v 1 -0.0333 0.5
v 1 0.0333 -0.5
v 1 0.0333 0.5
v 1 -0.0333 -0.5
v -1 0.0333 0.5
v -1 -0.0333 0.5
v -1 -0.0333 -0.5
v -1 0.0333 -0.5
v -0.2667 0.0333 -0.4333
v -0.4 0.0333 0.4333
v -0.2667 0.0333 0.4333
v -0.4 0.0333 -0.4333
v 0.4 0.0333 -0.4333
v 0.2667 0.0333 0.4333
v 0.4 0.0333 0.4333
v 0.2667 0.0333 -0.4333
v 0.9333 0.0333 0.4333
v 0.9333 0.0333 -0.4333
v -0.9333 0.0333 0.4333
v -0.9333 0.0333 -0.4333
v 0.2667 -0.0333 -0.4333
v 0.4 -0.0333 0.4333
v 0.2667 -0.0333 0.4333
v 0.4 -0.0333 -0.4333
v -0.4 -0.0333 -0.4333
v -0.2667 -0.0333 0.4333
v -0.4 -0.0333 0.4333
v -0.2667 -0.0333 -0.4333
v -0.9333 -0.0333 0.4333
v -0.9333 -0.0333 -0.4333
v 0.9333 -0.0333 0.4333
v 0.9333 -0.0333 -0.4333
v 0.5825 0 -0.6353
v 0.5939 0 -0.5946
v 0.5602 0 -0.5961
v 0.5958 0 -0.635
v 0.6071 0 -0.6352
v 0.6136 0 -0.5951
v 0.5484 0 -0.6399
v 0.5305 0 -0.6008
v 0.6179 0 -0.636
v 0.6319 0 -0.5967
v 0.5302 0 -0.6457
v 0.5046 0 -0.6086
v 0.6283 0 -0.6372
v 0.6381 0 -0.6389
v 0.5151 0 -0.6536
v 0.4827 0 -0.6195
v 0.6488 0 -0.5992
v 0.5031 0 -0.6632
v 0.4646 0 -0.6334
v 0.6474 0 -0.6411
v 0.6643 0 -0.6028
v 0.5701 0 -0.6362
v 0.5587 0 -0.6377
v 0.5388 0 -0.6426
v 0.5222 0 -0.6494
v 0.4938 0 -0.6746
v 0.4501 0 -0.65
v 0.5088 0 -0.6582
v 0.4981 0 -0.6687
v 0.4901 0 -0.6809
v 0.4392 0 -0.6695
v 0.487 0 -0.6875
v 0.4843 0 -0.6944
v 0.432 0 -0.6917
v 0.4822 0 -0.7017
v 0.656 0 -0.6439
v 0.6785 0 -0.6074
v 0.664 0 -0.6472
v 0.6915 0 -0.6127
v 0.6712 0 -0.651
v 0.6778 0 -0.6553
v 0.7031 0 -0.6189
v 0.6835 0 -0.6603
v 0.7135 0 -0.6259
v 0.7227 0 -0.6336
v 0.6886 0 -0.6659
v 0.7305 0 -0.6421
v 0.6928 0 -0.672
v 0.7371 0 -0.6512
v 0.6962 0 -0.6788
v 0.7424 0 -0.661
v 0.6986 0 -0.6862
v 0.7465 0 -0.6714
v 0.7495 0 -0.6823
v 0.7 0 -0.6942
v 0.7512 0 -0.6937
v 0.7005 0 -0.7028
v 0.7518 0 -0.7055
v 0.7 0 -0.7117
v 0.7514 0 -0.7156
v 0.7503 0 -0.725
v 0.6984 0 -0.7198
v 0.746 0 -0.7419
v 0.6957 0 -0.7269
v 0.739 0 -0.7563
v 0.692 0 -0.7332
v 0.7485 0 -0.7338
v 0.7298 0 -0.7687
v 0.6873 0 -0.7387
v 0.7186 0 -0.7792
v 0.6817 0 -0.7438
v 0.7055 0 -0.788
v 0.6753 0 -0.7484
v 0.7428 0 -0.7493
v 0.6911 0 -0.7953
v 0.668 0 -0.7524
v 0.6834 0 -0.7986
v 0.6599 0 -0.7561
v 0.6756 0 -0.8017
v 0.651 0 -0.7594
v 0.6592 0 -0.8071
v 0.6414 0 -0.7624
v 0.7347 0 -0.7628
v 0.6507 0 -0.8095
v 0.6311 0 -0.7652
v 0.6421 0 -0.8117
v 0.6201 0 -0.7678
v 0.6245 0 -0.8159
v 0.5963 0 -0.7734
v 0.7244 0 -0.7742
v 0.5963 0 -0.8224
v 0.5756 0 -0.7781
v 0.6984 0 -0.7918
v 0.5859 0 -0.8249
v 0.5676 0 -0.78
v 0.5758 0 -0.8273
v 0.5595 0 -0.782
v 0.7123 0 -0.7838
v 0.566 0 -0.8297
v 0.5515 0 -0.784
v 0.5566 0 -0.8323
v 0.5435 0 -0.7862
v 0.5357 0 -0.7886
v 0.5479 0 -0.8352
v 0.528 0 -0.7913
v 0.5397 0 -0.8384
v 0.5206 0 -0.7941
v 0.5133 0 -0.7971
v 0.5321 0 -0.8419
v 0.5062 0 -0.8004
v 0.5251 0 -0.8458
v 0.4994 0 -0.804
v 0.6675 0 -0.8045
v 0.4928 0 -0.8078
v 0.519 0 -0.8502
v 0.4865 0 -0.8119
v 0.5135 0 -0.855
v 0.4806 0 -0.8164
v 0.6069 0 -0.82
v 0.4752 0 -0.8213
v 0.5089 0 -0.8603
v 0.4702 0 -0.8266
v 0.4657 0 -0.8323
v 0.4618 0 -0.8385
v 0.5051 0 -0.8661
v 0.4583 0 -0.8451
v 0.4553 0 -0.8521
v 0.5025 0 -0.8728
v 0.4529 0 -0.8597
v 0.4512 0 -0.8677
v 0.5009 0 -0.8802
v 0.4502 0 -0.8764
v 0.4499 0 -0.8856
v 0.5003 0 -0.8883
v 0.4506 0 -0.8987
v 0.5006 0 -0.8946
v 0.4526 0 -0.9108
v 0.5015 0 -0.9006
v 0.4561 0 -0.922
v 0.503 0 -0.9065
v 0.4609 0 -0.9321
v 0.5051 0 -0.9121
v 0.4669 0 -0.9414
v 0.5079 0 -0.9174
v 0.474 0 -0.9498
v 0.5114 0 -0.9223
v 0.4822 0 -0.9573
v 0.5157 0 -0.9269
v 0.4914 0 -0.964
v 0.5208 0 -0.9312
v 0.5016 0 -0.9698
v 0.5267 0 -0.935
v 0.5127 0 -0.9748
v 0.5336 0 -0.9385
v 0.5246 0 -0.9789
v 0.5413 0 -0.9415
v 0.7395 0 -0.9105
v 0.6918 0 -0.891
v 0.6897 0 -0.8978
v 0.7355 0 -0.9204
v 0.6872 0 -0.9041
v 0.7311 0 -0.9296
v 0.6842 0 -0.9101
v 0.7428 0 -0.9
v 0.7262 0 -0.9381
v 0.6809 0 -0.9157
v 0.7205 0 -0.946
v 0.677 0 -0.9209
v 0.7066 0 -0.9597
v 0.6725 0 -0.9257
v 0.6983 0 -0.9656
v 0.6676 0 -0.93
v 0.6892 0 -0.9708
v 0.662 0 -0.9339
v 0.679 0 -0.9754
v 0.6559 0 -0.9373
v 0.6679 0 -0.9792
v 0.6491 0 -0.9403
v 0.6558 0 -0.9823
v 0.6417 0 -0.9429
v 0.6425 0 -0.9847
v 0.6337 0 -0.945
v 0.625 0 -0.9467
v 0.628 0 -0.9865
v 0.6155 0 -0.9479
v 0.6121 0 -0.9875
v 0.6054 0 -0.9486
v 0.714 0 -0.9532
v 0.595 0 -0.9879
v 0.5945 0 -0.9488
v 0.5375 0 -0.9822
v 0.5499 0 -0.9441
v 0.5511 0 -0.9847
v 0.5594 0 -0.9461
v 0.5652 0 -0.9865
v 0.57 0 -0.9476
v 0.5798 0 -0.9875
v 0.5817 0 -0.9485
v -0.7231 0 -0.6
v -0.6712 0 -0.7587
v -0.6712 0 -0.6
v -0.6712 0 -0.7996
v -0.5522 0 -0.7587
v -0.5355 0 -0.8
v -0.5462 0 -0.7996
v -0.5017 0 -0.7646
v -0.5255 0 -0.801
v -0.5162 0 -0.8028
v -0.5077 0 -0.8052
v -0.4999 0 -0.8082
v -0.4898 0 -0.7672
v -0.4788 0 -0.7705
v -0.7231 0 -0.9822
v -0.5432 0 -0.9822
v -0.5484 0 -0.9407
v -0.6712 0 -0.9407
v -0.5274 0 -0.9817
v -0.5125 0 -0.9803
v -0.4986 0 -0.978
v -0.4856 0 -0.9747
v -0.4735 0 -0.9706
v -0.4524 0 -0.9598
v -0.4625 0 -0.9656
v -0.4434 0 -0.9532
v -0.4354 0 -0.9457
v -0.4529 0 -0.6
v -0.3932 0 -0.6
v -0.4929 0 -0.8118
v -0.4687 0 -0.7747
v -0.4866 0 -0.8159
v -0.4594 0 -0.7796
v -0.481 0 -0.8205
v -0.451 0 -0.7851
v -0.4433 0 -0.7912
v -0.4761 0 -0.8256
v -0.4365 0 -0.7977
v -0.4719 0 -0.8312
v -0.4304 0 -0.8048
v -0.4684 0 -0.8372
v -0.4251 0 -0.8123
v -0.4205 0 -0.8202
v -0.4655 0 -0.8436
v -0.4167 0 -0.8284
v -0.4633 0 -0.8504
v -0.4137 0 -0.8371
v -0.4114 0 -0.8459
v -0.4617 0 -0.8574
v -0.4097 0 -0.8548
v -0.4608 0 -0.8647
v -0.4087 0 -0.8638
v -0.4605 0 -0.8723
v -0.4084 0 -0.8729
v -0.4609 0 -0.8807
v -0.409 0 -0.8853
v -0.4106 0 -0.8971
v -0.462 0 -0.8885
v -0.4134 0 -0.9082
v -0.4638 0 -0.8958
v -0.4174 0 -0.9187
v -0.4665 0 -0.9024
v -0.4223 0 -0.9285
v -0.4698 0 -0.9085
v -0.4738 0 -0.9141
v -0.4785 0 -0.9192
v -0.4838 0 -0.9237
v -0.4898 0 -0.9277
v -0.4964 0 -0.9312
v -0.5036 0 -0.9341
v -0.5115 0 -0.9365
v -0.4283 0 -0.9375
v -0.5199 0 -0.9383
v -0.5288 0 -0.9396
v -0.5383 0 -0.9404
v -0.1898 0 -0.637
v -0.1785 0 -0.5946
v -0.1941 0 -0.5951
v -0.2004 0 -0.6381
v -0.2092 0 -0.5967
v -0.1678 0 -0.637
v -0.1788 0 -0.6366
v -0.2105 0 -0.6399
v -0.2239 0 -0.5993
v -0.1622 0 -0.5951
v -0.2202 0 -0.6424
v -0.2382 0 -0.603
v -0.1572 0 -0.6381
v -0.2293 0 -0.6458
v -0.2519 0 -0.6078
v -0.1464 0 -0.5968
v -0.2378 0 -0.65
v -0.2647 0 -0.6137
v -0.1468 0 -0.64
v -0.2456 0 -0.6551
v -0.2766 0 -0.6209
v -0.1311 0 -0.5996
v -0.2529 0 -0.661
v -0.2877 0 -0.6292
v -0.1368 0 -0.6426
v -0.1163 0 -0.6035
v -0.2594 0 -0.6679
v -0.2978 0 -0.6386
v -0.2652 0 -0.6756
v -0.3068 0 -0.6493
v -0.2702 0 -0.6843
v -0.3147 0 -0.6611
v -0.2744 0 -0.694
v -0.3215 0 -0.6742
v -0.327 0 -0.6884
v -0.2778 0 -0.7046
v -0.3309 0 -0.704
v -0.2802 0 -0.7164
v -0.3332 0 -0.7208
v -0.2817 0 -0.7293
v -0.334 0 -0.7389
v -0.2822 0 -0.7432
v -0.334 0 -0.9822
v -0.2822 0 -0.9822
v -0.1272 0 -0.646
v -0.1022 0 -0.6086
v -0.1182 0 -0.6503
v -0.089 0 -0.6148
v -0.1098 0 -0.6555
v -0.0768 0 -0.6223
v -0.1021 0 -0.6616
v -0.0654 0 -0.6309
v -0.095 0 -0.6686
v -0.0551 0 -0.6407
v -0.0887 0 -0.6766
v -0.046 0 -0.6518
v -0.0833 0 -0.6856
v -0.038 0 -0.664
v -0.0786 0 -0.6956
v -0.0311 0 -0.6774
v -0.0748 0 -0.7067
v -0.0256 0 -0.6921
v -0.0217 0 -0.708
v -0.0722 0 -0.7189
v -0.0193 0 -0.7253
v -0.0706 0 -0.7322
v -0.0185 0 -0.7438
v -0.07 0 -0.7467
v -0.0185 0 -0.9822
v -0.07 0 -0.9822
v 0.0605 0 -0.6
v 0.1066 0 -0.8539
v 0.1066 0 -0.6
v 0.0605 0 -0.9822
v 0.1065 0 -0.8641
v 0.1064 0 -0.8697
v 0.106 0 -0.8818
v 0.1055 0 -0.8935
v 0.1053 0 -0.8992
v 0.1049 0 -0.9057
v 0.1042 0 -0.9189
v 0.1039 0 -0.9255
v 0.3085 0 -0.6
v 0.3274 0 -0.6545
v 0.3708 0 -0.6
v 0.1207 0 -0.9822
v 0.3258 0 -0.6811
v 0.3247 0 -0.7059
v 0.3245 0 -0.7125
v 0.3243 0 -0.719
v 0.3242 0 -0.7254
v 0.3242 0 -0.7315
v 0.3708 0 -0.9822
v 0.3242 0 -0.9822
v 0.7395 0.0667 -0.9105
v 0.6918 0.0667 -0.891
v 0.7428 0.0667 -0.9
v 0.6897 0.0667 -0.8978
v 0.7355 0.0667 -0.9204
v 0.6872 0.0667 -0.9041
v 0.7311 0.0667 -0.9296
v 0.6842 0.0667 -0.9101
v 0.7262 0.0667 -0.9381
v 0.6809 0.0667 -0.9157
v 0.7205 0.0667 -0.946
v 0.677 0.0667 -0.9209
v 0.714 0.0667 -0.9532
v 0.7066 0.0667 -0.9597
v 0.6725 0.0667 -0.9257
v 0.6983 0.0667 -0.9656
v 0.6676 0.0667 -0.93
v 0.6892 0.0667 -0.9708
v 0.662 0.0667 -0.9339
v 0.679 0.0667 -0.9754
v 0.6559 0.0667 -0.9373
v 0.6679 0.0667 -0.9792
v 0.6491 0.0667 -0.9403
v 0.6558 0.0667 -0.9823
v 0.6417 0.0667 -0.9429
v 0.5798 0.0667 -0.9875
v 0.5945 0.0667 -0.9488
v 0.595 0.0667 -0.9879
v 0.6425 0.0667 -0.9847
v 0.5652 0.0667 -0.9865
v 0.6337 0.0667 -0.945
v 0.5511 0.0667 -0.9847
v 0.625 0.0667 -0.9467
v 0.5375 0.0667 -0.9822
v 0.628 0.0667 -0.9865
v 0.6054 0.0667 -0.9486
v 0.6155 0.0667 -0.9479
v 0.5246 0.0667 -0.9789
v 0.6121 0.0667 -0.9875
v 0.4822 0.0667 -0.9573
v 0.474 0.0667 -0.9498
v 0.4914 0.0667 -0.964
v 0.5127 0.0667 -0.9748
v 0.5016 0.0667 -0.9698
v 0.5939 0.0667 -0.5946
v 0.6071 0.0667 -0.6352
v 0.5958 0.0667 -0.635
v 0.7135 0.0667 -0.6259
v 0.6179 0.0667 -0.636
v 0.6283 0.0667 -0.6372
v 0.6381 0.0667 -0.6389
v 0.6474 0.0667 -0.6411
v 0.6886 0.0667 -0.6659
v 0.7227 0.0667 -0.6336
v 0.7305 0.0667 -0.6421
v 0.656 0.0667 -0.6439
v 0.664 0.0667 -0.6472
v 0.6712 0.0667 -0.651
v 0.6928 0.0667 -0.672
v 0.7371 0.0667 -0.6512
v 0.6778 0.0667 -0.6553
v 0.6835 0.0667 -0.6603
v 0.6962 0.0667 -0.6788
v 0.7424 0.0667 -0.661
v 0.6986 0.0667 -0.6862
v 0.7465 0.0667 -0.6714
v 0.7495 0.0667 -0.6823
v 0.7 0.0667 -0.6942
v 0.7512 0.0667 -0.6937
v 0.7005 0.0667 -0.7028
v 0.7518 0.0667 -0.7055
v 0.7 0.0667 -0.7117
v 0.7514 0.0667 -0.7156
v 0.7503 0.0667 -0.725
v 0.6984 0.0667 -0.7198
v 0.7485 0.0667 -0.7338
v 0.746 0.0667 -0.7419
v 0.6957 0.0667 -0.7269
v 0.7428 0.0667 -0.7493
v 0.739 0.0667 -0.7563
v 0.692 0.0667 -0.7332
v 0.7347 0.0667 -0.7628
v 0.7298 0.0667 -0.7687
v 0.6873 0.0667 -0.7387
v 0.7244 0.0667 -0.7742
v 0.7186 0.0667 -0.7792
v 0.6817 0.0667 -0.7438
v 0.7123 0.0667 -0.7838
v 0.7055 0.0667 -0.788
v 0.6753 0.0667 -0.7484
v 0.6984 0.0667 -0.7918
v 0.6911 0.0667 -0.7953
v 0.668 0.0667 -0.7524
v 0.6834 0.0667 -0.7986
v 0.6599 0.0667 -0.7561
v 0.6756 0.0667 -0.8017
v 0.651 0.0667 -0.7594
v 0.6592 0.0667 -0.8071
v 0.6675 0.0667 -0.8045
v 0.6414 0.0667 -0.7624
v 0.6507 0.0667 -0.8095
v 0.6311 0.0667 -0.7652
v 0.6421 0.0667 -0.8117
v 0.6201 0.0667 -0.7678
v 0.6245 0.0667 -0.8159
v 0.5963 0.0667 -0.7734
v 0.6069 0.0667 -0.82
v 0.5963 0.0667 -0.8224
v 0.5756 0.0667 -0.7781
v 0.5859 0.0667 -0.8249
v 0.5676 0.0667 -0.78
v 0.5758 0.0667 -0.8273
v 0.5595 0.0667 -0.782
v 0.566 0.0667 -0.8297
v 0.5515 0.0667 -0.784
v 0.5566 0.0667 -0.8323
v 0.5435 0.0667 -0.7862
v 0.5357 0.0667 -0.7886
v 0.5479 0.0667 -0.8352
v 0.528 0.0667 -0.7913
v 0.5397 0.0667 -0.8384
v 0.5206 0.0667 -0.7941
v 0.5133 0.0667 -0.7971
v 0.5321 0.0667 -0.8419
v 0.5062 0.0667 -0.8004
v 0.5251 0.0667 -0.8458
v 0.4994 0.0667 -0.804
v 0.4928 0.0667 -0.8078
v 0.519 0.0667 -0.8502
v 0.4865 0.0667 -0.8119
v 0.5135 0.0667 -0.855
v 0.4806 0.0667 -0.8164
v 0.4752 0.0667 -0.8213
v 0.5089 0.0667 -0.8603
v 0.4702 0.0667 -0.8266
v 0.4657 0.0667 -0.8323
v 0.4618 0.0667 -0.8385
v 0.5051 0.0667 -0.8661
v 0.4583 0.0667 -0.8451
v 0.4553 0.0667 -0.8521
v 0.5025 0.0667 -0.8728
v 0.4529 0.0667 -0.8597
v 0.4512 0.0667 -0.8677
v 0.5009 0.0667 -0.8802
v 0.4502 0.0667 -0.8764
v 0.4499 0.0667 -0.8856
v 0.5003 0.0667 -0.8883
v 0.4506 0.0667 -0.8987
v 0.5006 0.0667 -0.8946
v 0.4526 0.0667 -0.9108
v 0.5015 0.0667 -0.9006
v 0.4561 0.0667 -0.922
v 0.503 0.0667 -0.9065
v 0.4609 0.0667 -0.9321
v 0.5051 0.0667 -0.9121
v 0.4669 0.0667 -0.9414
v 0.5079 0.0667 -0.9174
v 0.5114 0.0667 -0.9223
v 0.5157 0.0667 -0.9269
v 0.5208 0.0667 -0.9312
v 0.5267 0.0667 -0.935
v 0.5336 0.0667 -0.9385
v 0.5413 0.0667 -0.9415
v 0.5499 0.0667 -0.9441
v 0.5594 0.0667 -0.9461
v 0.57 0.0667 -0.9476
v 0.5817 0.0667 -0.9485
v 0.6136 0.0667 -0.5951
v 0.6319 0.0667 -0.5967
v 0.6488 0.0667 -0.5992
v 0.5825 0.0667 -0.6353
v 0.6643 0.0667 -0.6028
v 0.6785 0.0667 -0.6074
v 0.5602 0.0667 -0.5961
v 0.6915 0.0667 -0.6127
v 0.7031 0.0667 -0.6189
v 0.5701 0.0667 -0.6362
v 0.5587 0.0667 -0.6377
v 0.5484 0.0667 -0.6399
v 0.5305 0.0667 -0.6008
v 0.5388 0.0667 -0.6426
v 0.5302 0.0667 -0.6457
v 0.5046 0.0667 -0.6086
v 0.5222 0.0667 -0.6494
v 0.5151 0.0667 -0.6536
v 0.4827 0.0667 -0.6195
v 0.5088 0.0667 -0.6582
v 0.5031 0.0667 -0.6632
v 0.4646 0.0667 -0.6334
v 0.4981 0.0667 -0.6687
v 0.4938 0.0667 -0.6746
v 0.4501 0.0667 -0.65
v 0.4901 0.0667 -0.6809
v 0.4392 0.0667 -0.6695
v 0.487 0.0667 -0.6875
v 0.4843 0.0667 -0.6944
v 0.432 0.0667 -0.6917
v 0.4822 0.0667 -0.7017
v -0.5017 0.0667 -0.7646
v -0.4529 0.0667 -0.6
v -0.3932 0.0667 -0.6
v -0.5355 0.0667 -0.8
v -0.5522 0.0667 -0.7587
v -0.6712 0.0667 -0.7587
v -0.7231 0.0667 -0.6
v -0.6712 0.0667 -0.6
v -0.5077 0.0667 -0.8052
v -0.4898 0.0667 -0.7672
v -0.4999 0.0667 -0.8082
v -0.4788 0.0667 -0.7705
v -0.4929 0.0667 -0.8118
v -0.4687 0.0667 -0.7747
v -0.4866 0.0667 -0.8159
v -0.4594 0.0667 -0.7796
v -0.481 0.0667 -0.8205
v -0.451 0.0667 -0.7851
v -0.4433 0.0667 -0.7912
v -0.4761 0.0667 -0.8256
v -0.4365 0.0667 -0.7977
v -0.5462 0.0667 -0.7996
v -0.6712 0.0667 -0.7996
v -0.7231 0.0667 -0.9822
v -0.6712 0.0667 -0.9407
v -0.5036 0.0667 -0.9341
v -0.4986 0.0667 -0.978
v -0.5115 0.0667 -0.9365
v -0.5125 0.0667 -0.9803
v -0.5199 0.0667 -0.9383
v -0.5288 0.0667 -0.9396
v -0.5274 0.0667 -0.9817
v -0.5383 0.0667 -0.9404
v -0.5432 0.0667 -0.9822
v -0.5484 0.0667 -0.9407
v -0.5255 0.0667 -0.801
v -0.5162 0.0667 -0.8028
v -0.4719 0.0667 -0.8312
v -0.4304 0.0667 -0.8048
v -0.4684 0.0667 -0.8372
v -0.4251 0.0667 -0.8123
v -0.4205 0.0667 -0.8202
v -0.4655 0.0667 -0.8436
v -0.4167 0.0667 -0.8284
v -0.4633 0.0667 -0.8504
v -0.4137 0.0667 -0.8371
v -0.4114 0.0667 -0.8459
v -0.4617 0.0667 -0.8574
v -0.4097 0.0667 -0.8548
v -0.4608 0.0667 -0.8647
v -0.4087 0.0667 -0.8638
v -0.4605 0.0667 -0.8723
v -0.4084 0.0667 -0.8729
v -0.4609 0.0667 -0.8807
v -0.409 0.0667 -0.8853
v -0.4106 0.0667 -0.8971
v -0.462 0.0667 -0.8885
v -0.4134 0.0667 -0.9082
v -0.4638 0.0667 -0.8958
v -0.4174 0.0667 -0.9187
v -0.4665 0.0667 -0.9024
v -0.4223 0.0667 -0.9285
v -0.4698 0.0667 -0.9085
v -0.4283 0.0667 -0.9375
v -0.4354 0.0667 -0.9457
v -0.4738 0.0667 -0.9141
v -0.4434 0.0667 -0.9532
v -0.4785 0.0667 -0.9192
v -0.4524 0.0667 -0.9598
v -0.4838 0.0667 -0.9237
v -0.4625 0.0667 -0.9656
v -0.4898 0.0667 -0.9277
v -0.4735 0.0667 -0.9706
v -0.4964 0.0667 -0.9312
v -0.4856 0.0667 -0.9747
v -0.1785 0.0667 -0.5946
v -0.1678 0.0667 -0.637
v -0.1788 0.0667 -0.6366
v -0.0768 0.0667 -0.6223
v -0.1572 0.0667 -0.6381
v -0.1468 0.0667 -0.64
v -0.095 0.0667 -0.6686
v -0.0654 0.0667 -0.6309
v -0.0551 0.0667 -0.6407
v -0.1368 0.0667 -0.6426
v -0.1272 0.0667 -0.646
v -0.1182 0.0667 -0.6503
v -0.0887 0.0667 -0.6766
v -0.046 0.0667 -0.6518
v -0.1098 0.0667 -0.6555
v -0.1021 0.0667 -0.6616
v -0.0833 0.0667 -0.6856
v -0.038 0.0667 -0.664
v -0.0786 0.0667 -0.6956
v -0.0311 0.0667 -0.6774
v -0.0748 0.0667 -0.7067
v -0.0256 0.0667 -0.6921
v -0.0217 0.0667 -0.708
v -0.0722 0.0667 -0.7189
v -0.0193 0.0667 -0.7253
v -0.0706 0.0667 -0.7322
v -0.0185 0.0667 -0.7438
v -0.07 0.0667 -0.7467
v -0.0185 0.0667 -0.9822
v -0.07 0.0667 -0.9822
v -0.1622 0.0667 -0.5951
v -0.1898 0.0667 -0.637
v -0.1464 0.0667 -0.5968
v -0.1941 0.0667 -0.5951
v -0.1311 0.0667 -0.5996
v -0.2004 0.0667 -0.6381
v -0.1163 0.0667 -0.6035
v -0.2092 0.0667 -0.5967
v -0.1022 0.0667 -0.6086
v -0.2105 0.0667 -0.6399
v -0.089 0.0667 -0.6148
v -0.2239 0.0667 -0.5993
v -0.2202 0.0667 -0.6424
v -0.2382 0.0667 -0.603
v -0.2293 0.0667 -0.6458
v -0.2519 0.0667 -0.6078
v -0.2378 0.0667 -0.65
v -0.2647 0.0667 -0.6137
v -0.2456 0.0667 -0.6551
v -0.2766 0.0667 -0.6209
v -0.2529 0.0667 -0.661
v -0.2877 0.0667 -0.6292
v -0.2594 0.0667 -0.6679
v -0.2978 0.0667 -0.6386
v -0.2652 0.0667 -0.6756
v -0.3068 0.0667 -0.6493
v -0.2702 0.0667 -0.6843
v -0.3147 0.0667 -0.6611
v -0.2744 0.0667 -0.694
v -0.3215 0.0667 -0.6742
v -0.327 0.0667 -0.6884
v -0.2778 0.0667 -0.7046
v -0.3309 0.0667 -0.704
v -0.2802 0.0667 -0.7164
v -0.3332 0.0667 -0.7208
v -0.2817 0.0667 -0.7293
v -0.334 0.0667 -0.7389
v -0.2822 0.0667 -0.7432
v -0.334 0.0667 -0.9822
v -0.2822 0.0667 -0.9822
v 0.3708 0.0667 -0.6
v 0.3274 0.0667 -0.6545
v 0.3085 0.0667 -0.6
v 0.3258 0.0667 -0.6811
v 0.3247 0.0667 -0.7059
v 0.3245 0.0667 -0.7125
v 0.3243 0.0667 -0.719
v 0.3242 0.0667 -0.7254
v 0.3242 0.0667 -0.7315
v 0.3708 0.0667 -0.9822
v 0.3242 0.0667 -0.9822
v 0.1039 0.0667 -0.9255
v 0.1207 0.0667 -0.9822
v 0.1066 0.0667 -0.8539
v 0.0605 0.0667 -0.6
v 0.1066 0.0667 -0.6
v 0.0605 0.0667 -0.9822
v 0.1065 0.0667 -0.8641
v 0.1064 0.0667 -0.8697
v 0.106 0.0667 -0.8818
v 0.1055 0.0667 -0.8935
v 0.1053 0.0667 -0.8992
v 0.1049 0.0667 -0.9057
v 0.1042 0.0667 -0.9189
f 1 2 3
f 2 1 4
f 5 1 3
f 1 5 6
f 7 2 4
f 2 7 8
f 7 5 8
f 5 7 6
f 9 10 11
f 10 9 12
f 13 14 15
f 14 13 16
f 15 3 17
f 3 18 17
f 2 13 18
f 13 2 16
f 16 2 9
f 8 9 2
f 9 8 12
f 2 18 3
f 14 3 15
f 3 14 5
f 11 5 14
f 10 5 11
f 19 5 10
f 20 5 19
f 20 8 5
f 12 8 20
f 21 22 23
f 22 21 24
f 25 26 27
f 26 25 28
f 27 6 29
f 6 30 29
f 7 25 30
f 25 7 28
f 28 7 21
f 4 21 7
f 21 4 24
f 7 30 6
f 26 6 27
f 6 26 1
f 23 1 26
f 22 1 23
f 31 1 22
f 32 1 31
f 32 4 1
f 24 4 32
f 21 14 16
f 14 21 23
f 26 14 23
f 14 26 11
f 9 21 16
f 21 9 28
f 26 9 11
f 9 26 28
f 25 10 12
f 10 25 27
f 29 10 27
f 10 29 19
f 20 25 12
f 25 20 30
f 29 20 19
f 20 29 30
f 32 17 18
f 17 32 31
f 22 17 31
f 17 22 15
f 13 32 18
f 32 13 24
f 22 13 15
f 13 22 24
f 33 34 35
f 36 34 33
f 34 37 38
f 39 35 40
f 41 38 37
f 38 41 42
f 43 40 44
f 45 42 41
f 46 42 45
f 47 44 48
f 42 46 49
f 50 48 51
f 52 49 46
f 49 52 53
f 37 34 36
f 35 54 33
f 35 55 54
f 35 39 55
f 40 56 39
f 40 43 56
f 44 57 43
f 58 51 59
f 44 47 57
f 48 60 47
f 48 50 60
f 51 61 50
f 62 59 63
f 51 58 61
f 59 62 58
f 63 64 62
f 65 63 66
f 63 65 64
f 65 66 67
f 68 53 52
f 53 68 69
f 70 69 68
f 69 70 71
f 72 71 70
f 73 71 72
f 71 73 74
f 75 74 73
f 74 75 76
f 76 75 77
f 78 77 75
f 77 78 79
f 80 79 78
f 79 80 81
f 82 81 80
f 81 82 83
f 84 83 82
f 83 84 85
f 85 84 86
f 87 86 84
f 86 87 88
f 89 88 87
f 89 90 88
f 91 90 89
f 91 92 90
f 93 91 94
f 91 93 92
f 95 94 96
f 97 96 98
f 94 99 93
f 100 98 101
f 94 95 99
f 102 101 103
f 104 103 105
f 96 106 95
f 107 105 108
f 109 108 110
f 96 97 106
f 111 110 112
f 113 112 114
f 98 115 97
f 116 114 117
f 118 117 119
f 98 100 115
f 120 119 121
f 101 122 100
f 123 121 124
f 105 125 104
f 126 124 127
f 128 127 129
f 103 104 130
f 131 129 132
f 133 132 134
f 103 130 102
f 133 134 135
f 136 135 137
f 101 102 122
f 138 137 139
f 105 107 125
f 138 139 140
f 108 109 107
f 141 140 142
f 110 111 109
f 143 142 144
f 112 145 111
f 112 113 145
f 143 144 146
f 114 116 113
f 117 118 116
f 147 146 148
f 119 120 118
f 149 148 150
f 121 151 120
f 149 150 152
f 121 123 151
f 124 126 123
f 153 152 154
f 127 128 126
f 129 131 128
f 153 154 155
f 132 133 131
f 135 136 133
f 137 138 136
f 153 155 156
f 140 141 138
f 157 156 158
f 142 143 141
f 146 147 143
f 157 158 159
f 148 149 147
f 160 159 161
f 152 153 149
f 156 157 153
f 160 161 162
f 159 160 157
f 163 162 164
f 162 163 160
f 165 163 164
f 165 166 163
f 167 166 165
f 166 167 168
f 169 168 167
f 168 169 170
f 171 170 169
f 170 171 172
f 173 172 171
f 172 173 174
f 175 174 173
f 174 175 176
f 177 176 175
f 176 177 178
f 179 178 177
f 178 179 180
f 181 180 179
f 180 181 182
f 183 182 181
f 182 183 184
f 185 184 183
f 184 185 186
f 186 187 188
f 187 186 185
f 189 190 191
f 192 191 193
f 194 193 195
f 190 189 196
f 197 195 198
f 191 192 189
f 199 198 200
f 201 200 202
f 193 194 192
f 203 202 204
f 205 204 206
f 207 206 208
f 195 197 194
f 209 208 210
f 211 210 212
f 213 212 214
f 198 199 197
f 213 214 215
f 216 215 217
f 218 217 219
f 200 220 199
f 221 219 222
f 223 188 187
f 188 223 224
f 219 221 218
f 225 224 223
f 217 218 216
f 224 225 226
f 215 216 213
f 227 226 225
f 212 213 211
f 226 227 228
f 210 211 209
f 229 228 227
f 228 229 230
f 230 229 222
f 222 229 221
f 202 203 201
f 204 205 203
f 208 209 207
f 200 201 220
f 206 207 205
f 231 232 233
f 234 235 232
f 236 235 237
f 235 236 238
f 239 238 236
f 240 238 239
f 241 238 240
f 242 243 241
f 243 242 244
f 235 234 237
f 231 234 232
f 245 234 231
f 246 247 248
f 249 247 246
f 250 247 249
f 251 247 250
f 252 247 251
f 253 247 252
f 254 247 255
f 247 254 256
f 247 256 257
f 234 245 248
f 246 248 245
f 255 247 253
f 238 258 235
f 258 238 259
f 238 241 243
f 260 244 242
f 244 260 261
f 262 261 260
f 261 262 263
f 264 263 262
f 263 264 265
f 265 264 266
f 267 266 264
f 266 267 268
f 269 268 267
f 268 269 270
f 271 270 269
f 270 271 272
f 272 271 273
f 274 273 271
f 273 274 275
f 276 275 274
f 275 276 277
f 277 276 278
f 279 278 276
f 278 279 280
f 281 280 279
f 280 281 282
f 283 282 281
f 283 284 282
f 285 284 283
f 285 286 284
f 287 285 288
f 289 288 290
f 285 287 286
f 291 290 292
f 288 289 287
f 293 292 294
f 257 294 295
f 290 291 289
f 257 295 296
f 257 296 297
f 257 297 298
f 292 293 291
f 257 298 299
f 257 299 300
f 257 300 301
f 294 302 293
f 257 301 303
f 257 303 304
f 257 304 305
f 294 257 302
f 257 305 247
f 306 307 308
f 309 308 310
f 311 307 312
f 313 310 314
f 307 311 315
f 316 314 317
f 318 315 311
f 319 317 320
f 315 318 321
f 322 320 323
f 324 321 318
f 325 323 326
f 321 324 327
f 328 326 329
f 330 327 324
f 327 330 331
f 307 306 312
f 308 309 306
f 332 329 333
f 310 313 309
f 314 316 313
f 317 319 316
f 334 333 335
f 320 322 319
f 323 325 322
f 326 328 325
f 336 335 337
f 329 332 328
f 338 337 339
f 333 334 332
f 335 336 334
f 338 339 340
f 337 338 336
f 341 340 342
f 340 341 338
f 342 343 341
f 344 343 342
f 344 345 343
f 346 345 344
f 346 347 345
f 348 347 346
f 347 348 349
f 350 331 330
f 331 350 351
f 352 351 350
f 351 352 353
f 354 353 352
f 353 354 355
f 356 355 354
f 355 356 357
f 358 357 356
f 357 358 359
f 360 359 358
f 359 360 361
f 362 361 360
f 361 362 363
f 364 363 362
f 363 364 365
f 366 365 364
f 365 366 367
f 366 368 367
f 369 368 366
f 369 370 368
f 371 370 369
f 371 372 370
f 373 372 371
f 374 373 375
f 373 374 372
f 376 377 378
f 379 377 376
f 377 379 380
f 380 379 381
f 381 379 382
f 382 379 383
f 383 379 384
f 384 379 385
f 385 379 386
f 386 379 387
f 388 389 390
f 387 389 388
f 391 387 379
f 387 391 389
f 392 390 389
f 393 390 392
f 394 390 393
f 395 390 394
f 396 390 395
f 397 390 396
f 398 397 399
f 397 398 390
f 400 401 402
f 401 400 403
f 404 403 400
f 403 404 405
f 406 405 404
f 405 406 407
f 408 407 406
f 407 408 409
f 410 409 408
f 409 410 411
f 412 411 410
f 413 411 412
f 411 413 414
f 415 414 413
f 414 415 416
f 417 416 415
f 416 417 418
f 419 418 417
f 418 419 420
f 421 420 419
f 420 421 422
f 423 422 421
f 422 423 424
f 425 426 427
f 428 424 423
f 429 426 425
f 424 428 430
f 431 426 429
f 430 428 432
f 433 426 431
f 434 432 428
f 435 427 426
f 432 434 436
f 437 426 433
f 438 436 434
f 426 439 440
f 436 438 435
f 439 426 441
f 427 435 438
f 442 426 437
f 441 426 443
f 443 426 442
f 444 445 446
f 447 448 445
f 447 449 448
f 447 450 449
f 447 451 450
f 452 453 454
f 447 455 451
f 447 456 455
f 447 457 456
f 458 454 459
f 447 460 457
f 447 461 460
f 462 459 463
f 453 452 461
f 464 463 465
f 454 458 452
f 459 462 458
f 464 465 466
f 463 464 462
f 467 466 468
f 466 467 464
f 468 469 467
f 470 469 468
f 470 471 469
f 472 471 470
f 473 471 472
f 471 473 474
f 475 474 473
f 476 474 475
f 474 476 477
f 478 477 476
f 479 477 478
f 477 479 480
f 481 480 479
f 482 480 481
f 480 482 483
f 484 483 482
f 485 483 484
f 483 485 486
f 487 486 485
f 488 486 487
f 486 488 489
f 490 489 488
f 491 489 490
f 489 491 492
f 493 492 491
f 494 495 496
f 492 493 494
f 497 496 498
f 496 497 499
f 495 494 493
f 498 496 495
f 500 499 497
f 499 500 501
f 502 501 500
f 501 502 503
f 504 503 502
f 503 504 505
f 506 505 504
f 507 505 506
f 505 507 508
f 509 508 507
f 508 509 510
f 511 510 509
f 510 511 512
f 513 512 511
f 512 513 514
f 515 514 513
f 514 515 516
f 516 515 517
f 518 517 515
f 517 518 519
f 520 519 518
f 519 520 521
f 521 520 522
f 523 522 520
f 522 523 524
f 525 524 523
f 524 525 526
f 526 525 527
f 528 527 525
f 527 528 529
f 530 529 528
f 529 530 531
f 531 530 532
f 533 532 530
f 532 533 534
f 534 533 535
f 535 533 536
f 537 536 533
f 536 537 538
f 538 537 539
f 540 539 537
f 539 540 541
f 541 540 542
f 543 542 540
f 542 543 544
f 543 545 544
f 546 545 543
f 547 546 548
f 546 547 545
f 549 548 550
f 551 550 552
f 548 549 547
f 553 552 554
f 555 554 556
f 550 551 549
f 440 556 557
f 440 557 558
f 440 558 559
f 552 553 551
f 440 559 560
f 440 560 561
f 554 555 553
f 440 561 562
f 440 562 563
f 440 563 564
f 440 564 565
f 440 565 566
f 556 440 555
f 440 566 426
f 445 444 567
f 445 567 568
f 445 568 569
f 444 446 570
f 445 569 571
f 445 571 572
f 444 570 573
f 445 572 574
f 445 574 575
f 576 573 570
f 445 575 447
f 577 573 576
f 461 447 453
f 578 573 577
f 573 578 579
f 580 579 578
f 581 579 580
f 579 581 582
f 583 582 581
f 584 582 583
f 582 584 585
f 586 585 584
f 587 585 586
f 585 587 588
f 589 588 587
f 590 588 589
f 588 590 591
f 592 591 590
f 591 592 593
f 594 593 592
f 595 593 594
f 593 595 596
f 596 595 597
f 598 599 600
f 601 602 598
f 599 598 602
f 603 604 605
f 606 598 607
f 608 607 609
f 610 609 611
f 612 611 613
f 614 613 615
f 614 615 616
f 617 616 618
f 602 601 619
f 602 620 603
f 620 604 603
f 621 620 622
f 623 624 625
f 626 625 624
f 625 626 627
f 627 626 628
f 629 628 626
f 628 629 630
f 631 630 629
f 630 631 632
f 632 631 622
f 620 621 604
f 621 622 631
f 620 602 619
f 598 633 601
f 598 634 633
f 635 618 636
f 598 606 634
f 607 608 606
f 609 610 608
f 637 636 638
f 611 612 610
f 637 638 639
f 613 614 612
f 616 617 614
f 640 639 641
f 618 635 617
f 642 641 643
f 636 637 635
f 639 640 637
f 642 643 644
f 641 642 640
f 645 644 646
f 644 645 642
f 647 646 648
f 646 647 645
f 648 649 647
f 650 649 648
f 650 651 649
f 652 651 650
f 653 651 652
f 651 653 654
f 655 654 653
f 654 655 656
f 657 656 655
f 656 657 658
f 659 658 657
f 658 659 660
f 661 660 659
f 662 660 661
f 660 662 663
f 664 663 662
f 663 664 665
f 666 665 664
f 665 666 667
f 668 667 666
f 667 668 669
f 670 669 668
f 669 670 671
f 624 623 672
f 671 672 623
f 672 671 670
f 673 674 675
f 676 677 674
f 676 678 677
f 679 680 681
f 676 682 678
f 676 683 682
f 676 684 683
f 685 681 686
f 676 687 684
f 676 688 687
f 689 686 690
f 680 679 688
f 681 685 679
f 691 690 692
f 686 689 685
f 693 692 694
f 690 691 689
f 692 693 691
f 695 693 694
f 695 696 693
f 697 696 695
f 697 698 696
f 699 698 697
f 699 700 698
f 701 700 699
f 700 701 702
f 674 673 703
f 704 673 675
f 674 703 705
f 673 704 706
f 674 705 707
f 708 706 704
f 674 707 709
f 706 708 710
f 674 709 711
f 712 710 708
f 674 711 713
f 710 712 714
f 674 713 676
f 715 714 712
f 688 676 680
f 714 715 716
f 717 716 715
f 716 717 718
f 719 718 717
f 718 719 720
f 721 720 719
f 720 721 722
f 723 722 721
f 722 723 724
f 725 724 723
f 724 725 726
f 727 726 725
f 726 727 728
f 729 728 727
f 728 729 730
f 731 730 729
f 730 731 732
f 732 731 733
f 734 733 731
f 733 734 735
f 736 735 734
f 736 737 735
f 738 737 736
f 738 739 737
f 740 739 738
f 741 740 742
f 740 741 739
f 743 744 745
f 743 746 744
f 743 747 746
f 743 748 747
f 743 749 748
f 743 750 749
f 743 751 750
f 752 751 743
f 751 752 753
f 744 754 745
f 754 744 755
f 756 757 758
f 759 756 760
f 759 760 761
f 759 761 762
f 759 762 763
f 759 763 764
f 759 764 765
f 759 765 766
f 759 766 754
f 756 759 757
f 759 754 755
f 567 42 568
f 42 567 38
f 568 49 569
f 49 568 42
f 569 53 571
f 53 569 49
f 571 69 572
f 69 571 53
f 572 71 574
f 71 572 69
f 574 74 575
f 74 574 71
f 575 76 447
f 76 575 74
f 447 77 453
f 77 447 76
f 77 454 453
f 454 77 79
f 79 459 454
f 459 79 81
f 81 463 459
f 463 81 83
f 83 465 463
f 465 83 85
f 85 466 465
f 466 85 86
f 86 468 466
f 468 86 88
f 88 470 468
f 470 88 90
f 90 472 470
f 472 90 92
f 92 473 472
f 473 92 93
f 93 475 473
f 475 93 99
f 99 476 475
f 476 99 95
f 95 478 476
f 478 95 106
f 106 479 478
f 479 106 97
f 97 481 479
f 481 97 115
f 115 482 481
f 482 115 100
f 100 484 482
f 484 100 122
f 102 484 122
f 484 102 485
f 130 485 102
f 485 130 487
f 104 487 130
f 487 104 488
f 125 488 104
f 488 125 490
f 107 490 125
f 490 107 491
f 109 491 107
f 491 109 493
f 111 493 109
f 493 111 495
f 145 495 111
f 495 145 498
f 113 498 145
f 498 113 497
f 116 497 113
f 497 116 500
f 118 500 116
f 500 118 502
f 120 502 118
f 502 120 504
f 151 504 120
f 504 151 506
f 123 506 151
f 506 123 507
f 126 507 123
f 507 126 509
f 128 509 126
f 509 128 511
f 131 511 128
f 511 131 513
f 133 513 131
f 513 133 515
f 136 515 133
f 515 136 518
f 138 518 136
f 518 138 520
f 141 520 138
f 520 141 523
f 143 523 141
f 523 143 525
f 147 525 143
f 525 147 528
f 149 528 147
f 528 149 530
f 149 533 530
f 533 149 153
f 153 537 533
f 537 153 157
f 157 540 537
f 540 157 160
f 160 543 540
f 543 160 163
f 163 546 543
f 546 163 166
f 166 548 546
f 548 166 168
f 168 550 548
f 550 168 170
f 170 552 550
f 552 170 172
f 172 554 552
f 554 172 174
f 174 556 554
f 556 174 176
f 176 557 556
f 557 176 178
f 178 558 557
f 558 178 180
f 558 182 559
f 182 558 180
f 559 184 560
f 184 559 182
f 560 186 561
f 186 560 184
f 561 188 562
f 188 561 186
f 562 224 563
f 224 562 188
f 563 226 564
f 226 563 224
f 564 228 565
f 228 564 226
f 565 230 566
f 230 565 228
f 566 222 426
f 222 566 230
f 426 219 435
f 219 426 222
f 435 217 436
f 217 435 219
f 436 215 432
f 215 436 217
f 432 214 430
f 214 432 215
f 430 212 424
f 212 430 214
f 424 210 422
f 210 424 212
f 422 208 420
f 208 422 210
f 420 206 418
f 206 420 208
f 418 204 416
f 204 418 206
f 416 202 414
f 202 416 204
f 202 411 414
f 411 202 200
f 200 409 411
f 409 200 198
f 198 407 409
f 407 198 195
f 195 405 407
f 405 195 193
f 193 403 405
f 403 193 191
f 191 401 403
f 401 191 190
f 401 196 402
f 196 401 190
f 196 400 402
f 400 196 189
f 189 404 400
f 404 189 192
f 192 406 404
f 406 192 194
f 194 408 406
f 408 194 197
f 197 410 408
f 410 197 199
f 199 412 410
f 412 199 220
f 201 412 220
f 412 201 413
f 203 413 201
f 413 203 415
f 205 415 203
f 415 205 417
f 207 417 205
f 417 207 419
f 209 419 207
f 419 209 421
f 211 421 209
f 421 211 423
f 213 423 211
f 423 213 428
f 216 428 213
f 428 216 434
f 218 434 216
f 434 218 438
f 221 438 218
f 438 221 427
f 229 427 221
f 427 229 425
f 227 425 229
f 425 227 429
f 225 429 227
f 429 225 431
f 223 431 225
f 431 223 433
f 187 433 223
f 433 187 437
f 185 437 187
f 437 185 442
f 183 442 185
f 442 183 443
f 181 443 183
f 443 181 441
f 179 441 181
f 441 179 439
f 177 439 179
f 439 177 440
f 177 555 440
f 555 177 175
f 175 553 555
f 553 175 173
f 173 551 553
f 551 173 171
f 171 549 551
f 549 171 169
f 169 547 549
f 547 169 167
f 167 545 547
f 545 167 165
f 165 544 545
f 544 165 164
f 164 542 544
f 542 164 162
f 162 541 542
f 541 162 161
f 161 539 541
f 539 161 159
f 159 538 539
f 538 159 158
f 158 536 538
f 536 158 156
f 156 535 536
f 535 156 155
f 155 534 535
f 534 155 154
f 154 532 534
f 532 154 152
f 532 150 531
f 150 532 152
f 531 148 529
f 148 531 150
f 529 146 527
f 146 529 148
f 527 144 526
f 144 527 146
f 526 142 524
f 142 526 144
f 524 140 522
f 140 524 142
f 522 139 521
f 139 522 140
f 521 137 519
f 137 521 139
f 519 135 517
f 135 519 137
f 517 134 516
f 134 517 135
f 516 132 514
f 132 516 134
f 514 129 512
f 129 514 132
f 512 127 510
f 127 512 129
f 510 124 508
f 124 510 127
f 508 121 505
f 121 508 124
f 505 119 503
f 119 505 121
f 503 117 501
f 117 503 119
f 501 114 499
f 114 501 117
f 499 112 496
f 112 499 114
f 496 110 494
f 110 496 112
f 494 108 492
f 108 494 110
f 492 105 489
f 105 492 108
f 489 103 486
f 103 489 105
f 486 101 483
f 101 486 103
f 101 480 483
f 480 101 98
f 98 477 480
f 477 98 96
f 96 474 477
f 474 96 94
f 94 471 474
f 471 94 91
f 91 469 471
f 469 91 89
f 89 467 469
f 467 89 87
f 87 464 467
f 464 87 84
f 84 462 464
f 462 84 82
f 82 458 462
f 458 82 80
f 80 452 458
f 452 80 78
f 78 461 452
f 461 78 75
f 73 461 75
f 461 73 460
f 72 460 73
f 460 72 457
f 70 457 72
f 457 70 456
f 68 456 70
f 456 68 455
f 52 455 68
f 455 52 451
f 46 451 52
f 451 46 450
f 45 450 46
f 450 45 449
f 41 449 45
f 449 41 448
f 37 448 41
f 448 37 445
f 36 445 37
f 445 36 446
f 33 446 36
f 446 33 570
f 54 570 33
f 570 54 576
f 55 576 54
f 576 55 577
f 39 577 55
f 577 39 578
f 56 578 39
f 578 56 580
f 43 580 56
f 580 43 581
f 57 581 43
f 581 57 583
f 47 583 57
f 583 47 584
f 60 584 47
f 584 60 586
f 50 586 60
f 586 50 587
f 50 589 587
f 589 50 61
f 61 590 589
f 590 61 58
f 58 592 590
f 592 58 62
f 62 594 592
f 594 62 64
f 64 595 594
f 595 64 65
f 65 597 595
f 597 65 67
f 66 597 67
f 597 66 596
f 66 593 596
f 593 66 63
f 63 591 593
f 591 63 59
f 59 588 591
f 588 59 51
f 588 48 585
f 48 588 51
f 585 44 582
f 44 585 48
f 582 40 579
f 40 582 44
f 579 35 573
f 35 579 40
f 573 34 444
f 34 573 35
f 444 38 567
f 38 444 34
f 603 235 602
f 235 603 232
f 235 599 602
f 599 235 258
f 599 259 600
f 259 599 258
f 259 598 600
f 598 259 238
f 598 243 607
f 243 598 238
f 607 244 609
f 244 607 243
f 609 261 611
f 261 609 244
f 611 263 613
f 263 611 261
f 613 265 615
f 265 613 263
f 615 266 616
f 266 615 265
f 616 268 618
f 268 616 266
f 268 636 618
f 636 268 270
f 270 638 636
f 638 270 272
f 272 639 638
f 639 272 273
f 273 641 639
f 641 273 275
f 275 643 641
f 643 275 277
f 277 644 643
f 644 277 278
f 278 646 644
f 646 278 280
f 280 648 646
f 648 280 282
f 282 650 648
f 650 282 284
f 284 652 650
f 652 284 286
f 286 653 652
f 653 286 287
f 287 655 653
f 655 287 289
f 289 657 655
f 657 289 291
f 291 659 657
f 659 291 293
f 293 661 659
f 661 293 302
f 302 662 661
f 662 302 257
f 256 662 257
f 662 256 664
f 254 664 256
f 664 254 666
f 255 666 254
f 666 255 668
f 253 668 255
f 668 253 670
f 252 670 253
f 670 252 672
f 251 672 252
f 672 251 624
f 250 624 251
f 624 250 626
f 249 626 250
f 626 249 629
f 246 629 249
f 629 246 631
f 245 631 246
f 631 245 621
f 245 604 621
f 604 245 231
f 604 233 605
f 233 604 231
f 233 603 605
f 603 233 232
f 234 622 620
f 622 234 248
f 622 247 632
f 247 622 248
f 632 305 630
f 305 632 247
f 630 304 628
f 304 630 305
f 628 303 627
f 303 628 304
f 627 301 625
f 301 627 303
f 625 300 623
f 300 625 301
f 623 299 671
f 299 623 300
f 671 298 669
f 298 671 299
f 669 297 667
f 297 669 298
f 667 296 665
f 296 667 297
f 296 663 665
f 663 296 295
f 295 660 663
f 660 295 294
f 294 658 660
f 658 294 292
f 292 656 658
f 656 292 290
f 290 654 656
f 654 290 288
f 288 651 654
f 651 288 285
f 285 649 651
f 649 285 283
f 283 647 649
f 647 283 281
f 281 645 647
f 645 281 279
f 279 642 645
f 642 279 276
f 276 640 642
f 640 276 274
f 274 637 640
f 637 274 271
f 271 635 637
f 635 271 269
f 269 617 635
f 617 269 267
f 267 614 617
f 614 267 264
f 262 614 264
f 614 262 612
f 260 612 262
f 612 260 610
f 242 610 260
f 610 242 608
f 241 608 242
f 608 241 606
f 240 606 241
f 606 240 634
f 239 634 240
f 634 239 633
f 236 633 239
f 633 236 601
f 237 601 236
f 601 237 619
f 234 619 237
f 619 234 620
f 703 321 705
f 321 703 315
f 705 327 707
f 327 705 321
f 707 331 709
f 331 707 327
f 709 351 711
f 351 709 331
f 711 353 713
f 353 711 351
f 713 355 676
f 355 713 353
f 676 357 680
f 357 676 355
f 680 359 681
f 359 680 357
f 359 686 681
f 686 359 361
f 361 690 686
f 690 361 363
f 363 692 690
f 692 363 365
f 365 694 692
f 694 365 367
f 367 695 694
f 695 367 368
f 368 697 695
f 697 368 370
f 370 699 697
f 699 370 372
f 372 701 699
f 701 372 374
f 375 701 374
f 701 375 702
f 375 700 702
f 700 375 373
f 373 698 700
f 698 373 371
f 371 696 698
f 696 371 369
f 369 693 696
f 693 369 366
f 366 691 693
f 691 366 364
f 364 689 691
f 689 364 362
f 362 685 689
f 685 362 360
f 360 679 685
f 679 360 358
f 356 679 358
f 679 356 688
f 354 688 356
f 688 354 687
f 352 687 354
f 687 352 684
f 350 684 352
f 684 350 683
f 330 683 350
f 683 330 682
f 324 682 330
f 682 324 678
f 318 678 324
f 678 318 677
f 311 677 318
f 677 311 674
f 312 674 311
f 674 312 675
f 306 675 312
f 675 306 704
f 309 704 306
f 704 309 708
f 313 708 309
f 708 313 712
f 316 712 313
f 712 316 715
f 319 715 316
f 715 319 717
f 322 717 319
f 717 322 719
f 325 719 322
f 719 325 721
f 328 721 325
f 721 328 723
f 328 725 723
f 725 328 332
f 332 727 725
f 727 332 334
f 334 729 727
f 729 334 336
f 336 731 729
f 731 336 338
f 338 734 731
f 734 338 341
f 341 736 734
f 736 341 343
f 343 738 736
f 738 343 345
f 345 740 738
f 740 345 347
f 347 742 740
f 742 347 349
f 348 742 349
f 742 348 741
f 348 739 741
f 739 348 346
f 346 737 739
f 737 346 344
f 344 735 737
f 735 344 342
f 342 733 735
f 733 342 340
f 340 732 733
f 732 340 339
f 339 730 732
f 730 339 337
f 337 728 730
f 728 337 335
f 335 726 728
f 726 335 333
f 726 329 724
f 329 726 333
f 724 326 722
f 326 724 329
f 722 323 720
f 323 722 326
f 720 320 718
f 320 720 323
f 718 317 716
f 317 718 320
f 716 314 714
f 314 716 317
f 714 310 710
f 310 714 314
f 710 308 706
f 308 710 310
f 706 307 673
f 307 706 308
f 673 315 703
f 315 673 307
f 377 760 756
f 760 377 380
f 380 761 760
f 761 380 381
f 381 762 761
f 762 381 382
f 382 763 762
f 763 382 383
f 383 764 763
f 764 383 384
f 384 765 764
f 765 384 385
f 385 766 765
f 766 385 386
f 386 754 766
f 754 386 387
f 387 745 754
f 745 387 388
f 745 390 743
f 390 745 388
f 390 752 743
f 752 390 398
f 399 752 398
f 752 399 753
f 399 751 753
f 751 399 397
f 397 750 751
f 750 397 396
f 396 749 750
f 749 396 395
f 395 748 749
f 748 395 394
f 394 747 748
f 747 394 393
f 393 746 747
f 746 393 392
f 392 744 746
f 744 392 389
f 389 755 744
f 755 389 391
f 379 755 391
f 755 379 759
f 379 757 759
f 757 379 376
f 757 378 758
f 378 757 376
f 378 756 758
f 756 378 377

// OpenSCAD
$fa = 1;
$fs = 0.1;
mag = 1 / 15;
thickness = mag * 1;
height = mag * 15;
width = mag * 10;
border = mag * 1;
difference() {
cube([3 * width,thickness,height], center = true);
{    
cube([width - 2 * border, thickness, height - 2 * border], center = true);
translate([-width, 0, 0])
    cube([width - 2 * border, thickness, height - 2 * border], center = true);
translate([width, 0, 0])    
    cube([width - 2 * border, thickness, height - 2 * border], center = true);
}
}
//translate([width,0,height/3.5])
//rotate([-90,0,0])
//  linear_extrude(height = thickness)
//  text("7", size = 0.6, halign = "center");
//translate([0,0,height/3.5])
//rotate([-90,0,0])
//  linear_extrude(height = thickness)
//  text("0", size = 0.6, halign = "center");
//translate([-width,0,height/3.5])
//rotate([-90,0,0])
//  linear_extrude(height = thickness)
//  text("0", size = 0.6, halign = "center");
translate([0,0,-height*0.6])
rotate([-90,0,0])
  linear_extrude(height = thickness)
  text("RUNS", size = 0.4, halign = "center");
